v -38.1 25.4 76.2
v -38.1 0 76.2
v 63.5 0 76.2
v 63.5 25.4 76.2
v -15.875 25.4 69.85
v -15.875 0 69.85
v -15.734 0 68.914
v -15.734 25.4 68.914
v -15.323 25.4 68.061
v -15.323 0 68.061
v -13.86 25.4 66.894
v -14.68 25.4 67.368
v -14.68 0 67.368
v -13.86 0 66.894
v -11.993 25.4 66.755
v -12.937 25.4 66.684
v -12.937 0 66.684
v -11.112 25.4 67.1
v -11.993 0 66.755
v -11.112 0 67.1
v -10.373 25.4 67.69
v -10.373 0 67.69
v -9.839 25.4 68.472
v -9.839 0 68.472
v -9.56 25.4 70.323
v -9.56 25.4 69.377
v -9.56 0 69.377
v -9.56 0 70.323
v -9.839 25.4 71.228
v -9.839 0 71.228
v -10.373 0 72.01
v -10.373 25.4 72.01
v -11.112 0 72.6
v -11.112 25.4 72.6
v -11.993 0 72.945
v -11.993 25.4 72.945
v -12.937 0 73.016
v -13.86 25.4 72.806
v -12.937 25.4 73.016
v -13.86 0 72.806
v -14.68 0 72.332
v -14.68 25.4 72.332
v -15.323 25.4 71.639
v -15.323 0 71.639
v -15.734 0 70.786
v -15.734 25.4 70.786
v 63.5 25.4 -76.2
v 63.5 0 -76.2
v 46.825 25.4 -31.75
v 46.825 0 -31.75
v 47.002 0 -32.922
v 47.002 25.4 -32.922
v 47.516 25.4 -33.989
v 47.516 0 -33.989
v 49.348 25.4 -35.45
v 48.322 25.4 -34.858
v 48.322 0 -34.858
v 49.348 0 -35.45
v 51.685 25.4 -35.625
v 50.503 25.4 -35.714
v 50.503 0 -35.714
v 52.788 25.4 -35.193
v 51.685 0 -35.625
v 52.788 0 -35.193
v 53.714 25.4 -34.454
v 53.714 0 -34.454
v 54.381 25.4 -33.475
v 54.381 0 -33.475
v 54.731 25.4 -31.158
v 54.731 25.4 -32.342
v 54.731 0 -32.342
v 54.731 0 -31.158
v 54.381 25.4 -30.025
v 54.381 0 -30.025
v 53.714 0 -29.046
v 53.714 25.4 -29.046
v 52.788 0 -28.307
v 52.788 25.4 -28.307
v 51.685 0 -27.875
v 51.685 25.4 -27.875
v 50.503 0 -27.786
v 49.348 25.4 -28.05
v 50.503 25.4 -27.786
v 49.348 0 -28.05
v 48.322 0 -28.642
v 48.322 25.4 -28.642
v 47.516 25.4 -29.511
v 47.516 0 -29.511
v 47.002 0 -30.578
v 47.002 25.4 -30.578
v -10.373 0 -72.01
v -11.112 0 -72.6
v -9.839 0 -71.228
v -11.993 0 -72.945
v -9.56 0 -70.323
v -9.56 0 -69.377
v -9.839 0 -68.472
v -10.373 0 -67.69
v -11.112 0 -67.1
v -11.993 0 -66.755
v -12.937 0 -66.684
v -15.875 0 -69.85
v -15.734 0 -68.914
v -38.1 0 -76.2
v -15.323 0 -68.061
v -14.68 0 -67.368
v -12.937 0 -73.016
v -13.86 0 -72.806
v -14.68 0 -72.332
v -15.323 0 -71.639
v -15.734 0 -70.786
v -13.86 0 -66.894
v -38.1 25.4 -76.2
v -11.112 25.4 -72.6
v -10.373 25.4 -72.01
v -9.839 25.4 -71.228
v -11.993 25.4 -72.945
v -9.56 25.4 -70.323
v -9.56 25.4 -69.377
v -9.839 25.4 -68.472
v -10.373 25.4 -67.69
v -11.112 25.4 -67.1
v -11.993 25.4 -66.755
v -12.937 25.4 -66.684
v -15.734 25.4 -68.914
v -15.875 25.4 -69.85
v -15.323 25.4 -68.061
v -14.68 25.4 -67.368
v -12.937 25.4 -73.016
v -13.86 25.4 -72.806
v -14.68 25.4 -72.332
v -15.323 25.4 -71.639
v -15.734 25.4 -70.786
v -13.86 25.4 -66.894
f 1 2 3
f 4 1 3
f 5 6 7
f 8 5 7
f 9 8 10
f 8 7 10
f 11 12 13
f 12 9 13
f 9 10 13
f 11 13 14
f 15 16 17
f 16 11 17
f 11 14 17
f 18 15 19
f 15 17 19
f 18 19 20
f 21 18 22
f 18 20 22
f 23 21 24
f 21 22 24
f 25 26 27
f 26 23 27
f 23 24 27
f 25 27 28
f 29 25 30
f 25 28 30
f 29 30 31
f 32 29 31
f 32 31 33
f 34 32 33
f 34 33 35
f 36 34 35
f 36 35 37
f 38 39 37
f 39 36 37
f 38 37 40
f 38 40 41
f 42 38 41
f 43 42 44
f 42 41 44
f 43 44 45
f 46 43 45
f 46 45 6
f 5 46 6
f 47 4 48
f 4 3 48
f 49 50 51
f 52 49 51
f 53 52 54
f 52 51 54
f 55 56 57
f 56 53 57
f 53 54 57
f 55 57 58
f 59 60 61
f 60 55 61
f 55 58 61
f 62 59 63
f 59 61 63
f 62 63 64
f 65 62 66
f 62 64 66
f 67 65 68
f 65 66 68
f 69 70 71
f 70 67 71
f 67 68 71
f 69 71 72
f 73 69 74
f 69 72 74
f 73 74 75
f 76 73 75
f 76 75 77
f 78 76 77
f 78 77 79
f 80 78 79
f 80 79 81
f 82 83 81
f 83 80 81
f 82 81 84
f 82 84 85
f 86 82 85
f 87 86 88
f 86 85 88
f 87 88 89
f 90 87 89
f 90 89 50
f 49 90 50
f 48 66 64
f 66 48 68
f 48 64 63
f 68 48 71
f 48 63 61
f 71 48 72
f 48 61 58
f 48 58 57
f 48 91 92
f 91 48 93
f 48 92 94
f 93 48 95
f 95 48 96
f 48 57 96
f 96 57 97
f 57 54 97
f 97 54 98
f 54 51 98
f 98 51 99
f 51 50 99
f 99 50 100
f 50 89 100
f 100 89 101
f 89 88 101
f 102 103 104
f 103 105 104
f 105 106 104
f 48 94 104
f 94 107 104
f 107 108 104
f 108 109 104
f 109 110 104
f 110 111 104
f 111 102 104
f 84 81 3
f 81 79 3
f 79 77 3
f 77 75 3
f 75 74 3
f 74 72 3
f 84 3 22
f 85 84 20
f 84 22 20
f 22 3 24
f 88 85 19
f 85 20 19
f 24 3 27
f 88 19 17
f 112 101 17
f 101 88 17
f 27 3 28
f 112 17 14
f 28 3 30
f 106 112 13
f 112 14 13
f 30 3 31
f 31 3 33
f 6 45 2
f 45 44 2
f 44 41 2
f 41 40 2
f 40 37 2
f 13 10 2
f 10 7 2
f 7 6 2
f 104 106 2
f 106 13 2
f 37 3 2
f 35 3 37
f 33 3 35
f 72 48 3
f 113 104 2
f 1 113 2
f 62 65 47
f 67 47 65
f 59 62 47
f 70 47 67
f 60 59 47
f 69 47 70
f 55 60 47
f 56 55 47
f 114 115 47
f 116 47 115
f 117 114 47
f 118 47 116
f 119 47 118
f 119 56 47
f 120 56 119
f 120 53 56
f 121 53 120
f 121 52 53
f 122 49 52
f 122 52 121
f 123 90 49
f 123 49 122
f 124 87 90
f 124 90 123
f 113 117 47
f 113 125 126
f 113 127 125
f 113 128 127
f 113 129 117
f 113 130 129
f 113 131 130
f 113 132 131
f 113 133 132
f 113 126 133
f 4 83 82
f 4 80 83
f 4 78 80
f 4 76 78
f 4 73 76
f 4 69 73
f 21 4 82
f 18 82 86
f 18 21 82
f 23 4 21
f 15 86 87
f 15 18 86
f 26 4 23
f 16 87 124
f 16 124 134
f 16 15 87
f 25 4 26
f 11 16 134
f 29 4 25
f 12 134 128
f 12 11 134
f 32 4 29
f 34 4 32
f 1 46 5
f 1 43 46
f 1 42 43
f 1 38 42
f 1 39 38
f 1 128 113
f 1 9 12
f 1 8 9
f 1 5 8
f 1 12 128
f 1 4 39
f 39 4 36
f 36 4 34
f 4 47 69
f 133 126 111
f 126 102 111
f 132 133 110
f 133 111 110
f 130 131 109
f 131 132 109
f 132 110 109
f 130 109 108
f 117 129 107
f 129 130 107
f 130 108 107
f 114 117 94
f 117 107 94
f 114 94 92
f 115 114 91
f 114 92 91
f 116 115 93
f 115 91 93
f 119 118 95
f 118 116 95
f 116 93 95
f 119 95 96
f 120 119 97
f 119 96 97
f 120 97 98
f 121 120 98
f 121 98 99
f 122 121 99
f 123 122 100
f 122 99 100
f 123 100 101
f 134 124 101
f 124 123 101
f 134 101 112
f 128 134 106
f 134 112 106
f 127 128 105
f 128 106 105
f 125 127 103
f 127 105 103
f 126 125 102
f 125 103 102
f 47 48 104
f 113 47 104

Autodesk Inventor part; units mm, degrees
ref_plane "YZ Plane" through (0, 0, 0) normal (1, 0, 0) x (0, 1, 0)
ref_plane "XZ Plane" through (0, 0, 0) normal (0, 1, 0) x (-1, 0, 0)
ref_plane "XY Plane" through (0, 0, 0) normal (0, 0, 1) x (1, 0, 0)
sketch "Sketch1" plane through (0, 0, 0) normal (0, 1, 0) x (-1, 0, 0)
  line L0 (38.1, 76.2) -> (-63.5, 76.2)
  line L1 (-63.5, 76.2) -> (-63.5, -76.2)
  line L2 (-63.5, -76.2) -> (38.1, -76.2)
  line L3 (38.1, -76.2) -> (38.1, 76.2)
  circle A0 centre (-50.8, -31.75) radius 3.9751
  circle A1 centre (12.7, 69.85) radius 3.175
  circle A2 centre (12.7, -69.85) radius 3.175
  point P0 (0, 0)
  point P1 (38.1, 0)
  dimension "d0" = 152.4
  dimension "d1" = 101.6
  dimension "d2" = 38.1
  dimension "d6" = 7.9502
  dimension "d7" = 6.35
  dimension "d8" = 6.35
  dimension "d9" = 25.4
  dimension "d10" = 6.35
  dimension "d11" = 6.35
  dimension "d12" = 25.4
  dimension "d14" = 107.95
  dimension "d15" = 88.9
extrude "Extrusion1" add sketch "Sketch1" along normal blind 25.4
properties part number "Top Plate for Side to Side motion"
